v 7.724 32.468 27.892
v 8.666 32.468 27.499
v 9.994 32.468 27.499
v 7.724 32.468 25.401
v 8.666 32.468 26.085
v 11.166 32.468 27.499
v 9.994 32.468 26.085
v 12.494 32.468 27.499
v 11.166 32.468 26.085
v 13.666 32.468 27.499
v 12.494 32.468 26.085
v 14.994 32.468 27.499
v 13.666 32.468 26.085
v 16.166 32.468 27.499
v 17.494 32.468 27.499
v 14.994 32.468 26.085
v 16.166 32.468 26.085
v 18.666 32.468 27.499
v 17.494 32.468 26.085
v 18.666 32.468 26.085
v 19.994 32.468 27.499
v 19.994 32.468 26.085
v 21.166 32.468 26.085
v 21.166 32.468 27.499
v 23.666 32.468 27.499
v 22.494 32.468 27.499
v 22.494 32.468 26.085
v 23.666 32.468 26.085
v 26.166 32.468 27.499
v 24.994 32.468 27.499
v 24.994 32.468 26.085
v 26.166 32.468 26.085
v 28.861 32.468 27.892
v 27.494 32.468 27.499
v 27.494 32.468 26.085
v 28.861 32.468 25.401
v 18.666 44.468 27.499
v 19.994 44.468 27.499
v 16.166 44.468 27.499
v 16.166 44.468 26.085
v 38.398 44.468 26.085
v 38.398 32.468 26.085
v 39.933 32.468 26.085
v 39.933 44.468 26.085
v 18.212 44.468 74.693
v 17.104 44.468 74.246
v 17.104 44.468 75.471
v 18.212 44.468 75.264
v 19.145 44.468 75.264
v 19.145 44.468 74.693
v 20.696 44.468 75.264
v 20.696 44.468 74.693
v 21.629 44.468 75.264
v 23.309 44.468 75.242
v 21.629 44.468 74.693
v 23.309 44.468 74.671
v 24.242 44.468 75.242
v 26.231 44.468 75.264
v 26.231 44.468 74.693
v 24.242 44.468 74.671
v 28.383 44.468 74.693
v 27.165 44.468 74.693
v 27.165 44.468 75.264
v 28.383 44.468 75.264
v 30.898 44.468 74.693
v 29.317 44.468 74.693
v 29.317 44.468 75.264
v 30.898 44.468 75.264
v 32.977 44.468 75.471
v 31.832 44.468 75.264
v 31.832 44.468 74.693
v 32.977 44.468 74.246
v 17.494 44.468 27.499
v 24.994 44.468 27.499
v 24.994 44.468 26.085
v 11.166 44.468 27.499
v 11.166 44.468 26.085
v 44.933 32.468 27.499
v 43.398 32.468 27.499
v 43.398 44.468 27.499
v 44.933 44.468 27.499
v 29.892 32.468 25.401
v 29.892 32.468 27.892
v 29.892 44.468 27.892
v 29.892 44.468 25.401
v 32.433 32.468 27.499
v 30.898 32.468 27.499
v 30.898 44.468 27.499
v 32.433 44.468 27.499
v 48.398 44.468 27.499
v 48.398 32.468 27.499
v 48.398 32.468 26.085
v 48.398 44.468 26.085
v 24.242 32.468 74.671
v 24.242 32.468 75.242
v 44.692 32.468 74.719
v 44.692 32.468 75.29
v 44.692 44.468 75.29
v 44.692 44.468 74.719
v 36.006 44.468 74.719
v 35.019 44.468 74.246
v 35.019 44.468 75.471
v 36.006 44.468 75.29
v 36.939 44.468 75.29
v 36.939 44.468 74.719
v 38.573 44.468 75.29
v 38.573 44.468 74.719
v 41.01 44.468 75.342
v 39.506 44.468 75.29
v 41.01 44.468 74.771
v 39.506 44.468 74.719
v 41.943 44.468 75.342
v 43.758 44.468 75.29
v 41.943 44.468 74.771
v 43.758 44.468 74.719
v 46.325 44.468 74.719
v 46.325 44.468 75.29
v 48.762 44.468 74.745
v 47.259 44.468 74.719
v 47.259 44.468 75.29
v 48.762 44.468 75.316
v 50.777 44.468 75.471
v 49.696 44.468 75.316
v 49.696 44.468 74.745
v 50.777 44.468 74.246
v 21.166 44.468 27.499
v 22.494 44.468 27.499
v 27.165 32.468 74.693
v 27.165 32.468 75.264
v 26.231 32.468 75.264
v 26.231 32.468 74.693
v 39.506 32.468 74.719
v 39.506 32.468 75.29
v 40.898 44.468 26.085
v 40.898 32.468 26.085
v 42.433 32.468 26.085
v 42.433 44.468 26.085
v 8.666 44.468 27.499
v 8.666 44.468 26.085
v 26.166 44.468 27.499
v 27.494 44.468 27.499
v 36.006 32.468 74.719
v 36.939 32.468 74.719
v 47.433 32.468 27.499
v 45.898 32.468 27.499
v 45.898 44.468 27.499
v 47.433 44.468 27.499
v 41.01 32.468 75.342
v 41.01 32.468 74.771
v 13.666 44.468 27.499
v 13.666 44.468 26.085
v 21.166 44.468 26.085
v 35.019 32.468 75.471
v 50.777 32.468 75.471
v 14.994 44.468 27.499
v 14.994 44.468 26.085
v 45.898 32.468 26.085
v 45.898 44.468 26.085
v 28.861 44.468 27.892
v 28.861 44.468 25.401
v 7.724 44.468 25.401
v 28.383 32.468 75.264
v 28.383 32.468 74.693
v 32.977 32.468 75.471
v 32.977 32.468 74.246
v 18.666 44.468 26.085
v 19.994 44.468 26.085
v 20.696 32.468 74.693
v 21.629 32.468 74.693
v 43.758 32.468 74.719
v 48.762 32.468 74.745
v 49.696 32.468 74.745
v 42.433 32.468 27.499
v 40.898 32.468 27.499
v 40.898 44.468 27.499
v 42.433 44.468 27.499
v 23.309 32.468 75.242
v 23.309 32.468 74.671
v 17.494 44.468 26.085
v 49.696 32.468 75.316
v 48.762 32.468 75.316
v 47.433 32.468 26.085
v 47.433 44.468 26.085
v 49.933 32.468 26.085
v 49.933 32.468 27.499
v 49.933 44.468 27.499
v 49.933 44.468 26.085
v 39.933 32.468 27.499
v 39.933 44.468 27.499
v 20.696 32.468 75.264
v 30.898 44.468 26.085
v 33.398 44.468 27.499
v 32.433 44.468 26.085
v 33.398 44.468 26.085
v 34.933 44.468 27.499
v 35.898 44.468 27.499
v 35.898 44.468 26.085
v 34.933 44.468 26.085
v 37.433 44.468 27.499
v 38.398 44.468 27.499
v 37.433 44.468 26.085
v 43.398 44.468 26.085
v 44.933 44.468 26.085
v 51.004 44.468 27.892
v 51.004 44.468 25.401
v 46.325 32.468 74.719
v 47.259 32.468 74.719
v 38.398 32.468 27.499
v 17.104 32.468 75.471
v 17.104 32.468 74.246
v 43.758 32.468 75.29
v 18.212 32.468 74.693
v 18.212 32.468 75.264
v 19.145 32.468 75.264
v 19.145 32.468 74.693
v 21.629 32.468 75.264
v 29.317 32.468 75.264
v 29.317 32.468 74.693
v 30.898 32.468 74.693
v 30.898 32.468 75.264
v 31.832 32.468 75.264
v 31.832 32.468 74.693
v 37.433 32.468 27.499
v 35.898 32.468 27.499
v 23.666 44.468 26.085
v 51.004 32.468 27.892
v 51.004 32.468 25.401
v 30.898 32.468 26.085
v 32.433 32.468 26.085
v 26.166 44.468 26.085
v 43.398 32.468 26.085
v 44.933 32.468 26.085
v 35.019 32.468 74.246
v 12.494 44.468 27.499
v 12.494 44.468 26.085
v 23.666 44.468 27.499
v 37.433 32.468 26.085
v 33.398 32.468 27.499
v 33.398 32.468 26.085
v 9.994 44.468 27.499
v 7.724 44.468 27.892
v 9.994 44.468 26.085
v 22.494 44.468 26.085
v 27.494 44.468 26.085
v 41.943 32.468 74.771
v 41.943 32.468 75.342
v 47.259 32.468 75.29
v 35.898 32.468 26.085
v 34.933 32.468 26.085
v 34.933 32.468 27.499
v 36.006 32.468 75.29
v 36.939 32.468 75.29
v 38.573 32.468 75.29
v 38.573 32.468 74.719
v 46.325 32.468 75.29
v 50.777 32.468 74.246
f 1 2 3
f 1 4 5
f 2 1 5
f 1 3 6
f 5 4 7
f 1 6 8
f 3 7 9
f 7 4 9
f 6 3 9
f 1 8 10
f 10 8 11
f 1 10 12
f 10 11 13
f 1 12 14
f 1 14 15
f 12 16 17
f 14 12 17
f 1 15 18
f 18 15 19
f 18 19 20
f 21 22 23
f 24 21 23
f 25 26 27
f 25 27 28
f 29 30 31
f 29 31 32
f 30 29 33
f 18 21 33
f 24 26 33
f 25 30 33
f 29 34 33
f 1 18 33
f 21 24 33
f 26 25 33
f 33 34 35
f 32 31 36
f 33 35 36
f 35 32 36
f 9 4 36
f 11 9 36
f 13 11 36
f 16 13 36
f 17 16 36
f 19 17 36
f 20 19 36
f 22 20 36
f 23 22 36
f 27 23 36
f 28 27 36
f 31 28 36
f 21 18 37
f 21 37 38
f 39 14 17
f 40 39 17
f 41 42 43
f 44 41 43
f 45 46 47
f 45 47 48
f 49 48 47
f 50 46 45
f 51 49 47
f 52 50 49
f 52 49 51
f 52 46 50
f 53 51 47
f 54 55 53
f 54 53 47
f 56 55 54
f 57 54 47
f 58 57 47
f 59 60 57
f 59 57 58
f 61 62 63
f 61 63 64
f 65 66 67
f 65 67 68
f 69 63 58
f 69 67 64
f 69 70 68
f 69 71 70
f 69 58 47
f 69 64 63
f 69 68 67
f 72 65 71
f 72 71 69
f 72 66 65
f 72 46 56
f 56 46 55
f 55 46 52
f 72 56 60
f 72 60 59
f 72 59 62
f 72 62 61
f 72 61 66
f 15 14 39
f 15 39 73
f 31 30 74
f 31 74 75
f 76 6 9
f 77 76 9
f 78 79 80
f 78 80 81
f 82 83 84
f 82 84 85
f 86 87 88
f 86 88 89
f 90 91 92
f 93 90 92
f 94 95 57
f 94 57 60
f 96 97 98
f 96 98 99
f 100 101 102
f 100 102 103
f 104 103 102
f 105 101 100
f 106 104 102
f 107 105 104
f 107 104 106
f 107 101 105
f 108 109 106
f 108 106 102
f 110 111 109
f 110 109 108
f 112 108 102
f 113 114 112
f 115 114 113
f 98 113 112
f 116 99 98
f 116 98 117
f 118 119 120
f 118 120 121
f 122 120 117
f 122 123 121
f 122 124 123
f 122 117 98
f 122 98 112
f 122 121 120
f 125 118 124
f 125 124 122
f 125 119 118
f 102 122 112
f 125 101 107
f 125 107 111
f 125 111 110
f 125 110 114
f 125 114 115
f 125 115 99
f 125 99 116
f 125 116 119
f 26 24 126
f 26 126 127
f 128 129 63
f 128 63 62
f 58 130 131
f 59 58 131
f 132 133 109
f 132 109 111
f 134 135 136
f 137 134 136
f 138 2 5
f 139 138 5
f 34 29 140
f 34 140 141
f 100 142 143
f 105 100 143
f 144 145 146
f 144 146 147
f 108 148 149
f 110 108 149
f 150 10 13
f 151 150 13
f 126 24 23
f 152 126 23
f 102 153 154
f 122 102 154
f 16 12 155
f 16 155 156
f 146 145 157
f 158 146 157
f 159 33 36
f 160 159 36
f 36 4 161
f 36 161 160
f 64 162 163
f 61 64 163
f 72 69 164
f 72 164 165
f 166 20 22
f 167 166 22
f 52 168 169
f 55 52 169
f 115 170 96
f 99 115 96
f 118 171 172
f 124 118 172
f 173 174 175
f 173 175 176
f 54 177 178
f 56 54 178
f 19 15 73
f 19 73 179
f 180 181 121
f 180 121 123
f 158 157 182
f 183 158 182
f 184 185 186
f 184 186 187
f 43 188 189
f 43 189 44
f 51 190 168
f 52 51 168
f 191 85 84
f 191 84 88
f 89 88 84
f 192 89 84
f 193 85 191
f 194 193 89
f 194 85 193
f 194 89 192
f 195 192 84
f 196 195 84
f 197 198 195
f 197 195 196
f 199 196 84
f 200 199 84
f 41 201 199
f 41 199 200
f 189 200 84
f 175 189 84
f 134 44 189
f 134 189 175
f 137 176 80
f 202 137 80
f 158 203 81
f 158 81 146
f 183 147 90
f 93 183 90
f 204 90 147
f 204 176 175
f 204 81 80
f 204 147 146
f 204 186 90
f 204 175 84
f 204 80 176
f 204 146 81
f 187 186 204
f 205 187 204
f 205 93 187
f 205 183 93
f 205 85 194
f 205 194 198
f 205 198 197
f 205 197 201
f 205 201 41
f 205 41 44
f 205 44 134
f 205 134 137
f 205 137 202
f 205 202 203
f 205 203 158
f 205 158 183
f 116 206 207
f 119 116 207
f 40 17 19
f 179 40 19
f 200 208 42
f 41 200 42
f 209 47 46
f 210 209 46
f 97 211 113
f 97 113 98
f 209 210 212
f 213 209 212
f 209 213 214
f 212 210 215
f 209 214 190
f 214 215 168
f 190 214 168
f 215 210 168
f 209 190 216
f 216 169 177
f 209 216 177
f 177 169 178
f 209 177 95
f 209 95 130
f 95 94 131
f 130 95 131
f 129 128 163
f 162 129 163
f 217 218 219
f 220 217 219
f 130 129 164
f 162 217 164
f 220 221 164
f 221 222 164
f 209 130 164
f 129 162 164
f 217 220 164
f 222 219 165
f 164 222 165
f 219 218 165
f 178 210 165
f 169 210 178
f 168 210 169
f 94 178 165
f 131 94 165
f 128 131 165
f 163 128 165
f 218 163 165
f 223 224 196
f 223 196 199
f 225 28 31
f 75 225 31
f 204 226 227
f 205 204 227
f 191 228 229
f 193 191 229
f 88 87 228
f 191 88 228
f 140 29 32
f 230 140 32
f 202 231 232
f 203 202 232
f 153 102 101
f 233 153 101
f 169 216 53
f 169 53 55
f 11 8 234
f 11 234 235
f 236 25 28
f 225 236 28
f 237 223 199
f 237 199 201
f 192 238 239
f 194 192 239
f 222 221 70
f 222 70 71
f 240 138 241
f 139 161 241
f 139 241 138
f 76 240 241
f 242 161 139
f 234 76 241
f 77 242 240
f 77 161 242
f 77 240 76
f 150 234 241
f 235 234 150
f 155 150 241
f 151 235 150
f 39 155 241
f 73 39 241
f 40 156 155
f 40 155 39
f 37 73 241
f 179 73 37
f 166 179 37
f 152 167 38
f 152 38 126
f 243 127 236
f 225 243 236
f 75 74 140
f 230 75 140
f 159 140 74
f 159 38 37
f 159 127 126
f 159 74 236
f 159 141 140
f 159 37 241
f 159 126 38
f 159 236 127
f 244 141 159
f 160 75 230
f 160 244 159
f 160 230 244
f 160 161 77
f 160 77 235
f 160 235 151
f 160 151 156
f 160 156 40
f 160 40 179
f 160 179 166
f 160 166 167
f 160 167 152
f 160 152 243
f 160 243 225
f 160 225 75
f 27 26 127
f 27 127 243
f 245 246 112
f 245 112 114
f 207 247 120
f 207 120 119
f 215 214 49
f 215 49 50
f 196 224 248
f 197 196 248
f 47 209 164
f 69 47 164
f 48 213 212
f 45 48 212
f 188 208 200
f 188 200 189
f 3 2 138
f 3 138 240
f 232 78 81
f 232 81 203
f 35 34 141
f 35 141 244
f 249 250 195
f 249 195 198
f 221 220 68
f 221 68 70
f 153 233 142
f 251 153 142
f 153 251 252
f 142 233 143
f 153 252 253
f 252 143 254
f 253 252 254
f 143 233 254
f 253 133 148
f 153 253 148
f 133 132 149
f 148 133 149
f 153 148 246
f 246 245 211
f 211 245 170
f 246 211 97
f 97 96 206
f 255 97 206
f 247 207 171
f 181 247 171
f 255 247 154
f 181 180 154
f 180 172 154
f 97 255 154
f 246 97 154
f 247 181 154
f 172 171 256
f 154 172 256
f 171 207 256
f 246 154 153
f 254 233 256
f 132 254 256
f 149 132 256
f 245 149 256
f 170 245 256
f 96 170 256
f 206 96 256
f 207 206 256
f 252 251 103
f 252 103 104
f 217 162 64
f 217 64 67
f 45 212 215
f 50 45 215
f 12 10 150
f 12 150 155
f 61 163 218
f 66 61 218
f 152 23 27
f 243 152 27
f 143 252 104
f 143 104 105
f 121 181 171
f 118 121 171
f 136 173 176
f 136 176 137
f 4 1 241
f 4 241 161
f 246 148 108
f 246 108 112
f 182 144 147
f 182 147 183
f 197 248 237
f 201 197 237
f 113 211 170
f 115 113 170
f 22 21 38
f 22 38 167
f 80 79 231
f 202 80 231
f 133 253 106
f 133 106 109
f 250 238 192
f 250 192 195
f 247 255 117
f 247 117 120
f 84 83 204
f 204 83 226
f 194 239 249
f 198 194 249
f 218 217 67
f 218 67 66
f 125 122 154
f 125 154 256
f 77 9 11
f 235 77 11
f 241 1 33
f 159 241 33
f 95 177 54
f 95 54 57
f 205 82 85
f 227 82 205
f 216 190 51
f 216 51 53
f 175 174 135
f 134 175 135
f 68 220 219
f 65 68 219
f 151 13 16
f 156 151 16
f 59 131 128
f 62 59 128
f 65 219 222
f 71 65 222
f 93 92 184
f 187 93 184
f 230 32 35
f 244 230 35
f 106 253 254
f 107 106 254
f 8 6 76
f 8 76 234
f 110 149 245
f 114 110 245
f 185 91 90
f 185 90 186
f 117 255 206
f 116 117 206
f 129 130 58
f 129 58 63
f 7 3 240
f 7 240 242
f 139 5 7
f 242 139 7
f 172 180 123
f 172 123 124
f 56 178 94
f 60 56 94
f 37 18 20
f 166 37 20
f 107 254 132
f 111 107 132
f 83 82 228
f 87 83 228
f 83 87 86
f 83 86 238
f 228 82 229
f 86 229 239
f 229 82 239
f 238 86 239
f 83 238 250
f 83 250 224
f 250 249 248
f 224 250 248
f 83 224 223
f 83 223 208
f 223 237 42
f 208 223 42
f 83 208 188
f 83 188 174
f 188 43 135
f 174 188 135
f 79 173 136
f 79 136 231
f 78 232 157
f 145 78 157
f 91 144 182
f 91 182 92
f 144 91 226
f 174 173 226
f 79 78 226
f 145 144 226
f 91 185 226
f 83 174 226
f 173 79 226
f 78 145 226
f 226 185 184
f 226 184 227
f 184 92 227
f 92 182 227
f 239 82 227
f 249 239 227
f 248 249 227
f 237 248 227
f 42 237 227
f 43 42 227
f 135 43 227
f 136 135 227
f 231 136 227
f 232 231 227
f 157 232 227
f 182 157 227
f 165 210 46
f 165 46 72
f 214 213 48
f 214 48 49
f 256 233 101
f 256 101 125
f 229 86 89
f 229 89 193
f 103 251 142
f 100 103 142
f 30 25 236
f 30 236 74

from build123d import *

# Parameters (mm, degrees)
CROQUIS1_W                = 21.13697434
CROQUIS1_H                = 2.491757137
CROQUIS1_W_2              = 1.3289884
CROQUIS1_H_2              = 1.414729588
SALIENTE_EXTRUIR1_DEPTH   = 12
CROQUIS1_W_3              = 21.11114987
CROQUIS1_W_4              = 1.534651331
SALIENTE_EXTRUIR1_2_DEPTH = 12
CROQUIS1_W_5              = 15.872405115
CROQUIS1_H_3              = 1.224219714
CROQUIS1_W_6              = 0.933395143
CROQUIS1_H_4              = 0.570408143
CROQUIS1_W_7              = 0.933395142
CROQUIS1_H_5              = 0.570408142
SALIENTE_EXTRUIR1_3_DEPTH = 12
CROQUIS1_W_8              = 15.758129679
SALIENTE_EXTRUIR1_4_DEPTH = 12


with BuildPart() as part:
    # Croquis1 → Saliente-Extruir1 (new body)
    with BuildSketch(Plane(origin=(0, 32.468175746, 0), x_dir=(1, 0, 0), z_dir=(0, 1, 0))):
        with Locations((18.292801832, -26.646426471)):
            Rectangle(CROQUIS1_W, CROQUIS1_H)
        with Locations((26.829996904, -26.792090507)):
            Rectangle(CROQUIS1_W_2, CROQUIS1_H_2, mode=Mode.SUBTRACT)
        with Locations((24.329996904, -26.792090507)):
            Rectangle(CROQUIS1_W_2, CROQUIS1_H_2, mode=Mode.SUBTRACT)
        with Locations((21.829996904, -26.792090507)):
            Rectangle(CROQUIS1_W_2, CROQUIS1_H_2, mode=Mode.SUBTRACT)
        with Locations((19.329996904, -26.792090507)):
            Rectangle(CROQUIS1_W_2, CROQUIS1_H_2, mode=Mode.SUBTRACT)
        with Locations((16.829996904, -26.792090507)):
            Rectangle(CROQUIS1_W_2, CROQUIS1_H_2, mode=Mode.SUBTRACT)
        with Locations((14.329996904, -26.792090507)):
            Rectangle(CROQUIS1_W_2, CROQUIS1_H_2, mode=Mode.SUBTRACT)
        with Locations((11.829996904, -26.792090507)):
            Rectangle(CROQUIS1_W_2, CROQUIS1_H_2, mode=Mode.SUBTRACT)
        with Locations((9.329996904, -26.792090507)):
            Rectangle(CROQUIS1_W_2, CROQUIS1_H_2, mode=Mode.SUBTRACT)
    extrude(amount=SALIENTE_EXTRUIR1_DEPTH)


with BuildPart() as body_2:
    # Croquis1 → Saliente-Extruir1 2 (new body)
    with BuildSketch(Plane(origin=(0, 32.468175746, 0), x_dir=(1, 0, 0), z_dir=(0, 1, 0))):
        with Locations((40.447935856, -26.646426471)):
            Rectangle(CROQUIS1_W_3, CROQUIS1_H)
        with Locations((49.165634111, -26.792090507)):
            Rectangle(CROQUIS1_W_4, CROQUIS1_H_2, mode=Mode.SUBTRACT)
        with Locations((46.665634111, -26.792090507)):
            Rectangle(CROQUIS1_W_4, CROQUIS1_H_2, mode=Mode.SUBTRACT)
        with Locations((44.165634111, -26.792090507)):
            Rectangle(CROQUIS1_W_4, CROQUIS1_H_2, mode=Mode.SUBTRACT)
        with Locations((41.665634111, -26.792090507)):
            Rectangle(CROQUIS1_W_4, CROQUIS1_H_2, mode=Mode.SUBTRACT)
        with Locations((39.165634111, -26.792090507)):
            Rectangle(CROQUIS1_W_4, CROQUIS1_H_2, mode=Mode.SUBTRACT)
        with Locations((36.665634111, -26.792090507)):
            Rectangle(CROQUIS1_W_4, CROQUIS1_H_2, mode=Mode.SUBTRACT)
        with Locations((34.165634111, -26.792090507)):
            Rectangle(CROQUIS1_W_4, CROQUIS1_H_2, mode=Mode.SUBTRACT)
        with Locations((31.665634112, -26.792090507)):
            Rectangle(CROQUIS1_W_4, CROQUIS1_H_2, mode=Mode.SUBTRACT)
    extrude(amount=SALIENTE_EXTRUIR1_2_DEPTH)


with BuildPart() as body_3:
    # Croquis1 → Saliente-Extruir1 3 (new body)
    with BuildSketch(Plane(origin=(0, 32.468175746, 0), x_dir=(1, 0, 0), z_dir=(0, 1, 0))):
        with Locations((25.040468248, -74.858584693)):
            Rectangle(CROQUIS1_W_5, CROQUIS1_H_3)
        with Locations((21.162525946, -74.978698992)):
            Rectangle(CROQUIS1_W_6, CROQUIS1_H_4, mode=Mode.SUBTRACT)
        with Locations((26.698030304, -74.978698992)):
            Rectangle(CROQUIS1_W_6, CROQUIS1_H_4, mode=Mode.SUBTRACT)
        with Locations((31.365006017, -74.978698992)):
            Rectangle(CROQUIS1_W_7, CROQUIS1_H_4, mode=Mode.SUBTRACT)
        with Locations((28.850024661, -74.978698992)):
            Rectangle(CROQUIS1_W_6, CROQUIS1_H_4, mode=Mode.SUBTRACT)
        with Locations((18.678299237, -74.978698992)):
            Rectangle(CROQUIS1_W_6, CROQUIS1_H_4, mode=Mode.SUBTRACT)
        with Locations((23.775536855, -74.956559737)):
            Rectangle(CROQUIS1_W_6, CROQUIS1_H_5, mode=Mode.SUBTRACT)
    extrude(amount=SALIENTE_EXTRUIR1_3_DEPTH)


with BuildPart() as body_4:
    # Croquis1 → Saliente-Extruir1 4 (new body)
    with BuildSketch(Plane(origin=(0, 32.468175746, 0), x_dir=(1, 0, 0), z_dir=(0, 1, 0))):
        with Locations((42.898049179, -74.858584693)):
            Rectangle(CROQUIS1_W_8, CROQUIS1_H_3)
        with Locations((46.791953516, -75.004626634)):
            Rectangle(CROQUIS1_W_7, CROQUIS1_H_5, mode=Mode.SUBTRACT)
        with Locations((41.476786731, -75.05648192)):
            Rectangle(CROQUIS1_W_6, CROQUIS1_H_4, mode=Mode.SUBTRACT)
        with Locations((36.47275166, -75.004626634)):
            Rectangle(CROQUIS1_W_6, CROQUIS1_H_5, mode=Mode.SUBTRACT)
        with Locations((39.039588303, -75.004626634)):
            Rectangle(CROQUIS1_W_6, CROQUIS1_H_5, mode=Mode.SUBTRACT)
        with Locations((44.225116873, -75.004626634)):
            Rectangle(CROQUIS1_W_6, CROQUIS1_H_5, mode=Mode.SUBTRACT)
        with Locations((49.229151945, -75.030554276)):
            Rectangle(CROQUIS1_W_6, CROQUIS1_H_4, mode=Mode.SUBTRACT)
    extrude(amount=SALIENTE_EXTRUIR1_4_DEPTH)


solid = Compound([part.part, body_2.part, body_3.part, body_4.part])
